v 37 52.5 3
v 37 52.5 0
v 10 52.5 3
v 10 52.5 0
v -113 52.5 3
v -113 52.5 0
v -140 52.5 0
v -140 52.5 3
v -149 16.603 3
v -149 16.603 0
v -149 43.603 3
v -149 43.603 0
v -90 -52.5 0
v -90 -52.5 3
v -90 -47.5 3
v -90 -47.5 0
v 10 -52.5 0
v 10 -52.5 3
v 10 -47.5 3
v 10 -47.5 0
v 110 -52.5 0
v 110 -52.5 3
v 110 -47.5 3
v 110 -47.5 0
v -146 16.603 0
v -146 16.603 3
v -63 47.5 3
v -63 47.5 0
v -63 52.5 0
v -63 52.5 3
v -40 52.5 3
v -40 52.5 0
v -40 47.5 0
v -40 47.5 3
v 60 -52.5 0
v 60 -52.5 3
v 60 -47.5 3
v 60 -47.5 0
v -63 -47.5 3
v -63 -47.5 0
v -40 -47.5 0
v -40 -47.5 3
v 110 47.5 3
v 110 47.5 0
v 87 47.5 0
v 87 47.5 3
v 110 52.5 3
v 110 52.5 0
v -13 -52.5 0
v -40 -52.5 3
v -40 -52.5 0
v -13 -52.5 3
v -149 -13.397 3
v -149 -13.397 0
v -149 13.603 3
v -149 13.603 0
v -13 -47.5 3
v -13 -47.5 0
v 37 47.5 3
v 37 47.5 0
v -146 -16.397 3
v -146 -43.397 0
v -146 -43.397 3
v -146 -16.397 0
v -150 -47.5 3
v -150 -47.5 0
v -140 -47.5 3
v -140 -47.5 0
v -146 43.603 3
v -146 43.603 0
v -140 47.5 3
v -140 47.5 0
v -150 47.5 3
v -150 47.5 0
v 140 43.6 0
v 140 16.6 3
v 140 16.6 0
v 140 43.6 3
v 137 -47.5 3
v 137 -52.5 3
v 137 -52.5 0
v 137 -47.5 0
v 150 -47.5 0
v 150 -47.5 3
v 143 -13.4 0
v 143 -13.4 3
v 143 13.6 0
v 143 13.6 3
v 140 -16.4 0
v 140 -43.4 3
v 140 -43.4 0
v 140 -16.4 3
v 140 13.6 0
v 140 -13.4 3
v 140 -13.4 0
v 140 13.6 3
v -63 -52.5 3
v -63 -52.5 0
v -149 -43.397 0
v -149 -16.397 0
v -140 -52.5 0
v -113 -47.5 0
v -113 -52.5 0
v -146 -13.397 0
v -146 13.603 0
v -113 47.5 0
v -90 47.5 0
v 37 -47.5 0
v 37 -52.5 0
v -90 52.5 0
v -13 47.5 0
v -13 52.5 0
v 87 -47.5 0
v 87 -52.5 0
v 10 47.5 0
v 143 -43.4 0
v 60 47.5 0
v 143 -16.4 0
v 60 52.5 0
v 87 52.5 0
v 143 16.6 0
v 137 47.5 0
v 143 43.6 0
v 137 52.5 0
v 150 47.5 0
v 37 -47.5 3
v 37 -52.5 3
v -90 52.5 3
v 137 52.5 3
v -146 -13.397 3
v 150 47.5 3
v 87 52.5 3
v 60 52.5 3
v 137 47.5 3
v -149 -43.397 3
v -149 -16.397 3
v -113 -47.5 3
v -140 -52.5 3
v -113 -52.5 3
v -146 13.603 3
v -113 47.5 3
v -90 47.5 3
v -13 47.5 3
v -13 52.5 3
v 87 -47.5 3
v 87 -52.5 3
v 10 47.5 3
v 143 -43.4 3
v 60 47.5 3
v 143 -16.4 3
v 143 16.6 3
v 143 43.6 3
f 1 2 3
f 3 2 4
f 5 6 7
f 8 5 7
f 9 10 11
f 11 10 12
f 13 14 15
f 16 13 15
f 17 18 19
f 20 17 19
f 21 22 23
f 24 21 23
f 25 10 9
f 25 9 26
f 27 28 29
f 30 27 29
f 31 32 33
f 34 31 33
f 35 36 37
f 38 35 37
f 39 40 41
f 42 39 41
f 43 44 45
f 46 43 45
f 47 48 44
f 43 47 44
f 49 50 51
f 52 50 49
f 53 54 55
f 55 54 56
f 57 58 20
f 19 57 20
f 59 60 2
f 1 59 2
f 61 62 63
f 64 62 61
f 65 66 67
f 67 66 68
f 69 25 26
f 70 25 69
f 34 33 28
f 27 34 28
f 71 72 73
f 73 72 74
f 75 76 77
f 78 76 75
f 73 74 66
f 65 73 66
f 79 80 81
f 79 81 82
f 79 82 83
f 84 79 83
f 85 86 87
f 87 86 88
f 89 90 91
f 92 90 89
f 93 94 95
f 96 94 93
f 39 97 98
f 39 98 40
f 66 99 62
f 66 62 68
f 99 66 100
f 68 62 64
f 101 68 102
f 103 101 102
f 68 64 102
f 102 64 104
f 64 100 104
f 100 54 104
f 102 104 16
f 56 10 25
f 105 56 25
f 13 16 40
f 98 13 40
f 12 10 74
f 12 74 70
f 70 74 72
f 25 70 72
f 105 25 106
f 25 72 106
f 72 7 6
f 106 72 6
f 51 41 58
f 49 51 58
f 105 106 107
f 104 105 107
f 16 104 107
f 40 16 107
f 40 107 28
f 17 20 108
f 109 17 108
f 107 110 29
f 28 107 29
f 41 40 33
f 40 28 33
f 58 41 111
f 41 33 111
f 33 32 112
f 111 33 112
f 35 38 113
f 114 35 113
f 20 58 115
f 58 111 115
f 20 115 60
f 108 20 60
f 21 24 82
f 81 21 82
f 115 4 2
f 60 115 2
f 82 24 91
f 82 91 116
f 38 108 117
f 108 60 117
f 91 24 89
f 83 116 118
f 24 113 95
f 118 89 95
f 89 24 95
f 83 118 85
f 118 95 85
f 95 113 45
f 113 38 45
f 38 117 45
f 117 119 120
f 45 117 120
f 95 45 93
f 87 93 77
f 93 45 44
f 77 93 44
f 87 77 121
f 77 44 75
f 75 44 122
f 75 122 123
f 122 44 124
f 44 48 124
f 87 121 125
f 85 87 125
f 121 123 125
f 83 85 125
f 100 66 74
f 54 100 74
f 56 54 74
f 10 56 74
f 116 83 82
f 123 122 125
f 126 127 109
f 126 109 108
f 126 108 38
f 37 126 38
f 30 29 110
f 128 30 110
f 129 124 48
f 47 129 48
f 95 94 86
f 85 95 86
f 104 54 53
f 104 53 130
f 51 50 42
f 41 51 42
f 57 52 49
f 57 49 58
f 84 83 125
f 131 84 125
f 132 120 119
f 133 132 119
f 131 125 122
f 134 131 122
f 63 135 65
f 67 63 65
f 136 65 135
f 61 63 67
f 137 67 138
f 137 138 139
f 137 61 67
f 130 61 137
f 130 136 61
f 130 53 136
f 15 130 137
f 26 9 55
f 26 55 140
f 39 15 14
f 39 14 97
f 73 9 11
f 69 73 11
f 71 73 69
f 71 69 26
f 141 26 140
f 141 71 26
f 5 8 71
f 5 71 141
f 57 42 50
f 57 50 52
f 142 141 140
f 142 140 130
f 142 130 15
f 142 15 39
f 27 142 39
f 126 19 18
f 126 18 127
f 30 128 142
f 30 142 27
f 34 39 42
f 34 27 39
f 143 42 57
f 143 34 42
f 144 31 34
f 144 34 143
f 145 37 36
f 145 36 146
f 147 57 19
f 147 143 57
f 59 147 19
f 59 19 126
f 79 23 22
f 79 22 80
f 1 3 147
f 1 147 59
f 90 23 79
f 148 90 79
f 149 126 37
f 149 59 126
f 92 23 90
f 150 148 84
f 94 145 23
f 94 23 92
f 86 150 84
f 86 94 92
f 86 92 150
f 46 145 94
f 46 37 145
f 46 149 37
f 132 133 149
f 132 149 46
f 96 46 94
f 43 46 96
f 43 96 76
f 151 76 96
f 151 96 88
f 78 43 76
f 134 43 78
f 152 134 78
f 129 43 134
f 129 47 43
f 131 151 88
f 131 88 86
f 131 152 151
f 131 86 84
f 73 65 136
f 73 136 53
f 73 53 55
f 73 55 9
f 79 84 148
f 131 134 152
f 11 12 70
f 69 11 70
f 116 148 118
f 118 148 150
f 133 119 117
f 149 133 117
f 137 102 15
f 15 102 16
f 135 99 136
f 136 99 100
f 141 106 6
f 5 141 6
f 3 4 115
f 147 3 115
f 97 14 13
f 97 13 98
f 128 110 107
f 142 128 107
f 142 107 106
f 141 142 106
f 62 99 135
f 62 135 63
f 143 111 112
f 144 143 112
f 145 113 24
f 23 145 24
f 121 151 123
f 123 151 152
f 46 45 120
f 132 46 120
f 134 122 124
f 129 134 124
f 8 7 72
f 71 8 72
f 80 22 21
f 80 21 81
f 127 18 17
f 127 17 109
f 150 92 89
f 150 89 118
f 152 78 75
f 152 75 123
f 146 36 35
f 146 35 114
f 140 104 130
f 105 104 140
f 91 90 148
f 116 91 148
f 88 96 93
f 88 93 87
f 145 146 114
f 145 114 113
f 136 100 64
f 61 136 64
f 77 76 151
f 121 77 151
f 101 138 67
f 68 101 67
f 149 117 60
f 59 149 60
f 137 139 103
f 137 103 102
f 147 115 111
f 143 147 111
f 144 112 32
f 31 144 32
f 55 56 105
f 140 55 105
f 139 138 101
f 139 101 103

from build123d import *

# Parameters (mm, degrees)
SKETCH1_W           = 3
SKETCH1_H           = 27
BOSS_EXTRUDE1_DEPTH = 3
SKETCH2_W           = 3
SKETCH2_H           = 27
CUT_EXTRUDE1_DEPTH  = 10
SKETCH3_W           = 27
SKETCH3_H           = 5
BOSS_EXTRUDE3_DEPTH = 3


with BuildPart() as part:
    # Sketch1 → Boss-Extrude1 (new body)
    with BuildSketch(Plane.XY):
        Polygon((-90, 52.5), (-90, 47.5), (-113, 47.5), (-113, 52.5), (-140, 52.5), (-140, 47.5), (-150, 47.5), (-150, -47.5), (150, -47.5), (150, 47.5), (137, 47.5), (137, 52.5), (110, 52.5), (110, 47.5), (87, 47.5), (87, 52.5), (60, 52.5), (60, 47.5), (37, 47.5), (37, 52.5), (10, 52.5), (10, 47.5), (-13, 47.5), (-13, 52.5), (-40, 52.5), (-40, 47.5), (-63, 47.5), (-63, 52.5), align=None)
        with Locations((-147.5, 30.102605219)):
            Rectangle(SKETCH1_W, SKETCH1_H, mode=Mode.SUBTRACT)
        with Locations((-147.5, -29.897394781)):
            Rectangle(SKETCH1_W, SKETCH1_H, mode=Mode.SUBTRACT)
        with Locations((-147.5, 0.102605219)):
            Rectangle(SKETCH1_W, SKETCH1_H, mode=Mode.SUBTRACT)
    extrude(amount=BOSS_EXTRUDE1_DEPTH)

    # Sketch2 → Cut-Extrude1 (cut)
    with BuildSketch(Plane.XY.offset(3)):
        with Locations((141.5, 30.1)):
            Rectangle(SKETCH2_W, SKETCH2_H)
        with Locations((141.5, 0.1)):
            Rectangle(SKETCH2_W, SKETCH2_H)
        with Locations((141.5, -29.9)):
            Rectangle(SKETCH2_W, SKETCH2_H)
    extrude(amount=-CUT_EXTRUDE1_DEPTH, mode=Mode.SUBTRACT)

    # Sketch3 → Boss-Extrude3 (add)
    with BuildSketch(Plane.XY.offset(3)):
        with Locations((-126.5, -50)):
            Rectangle(SKETCH3_W, SKETCH3_H)
        with Locations((-76.5, -50)):
            Rectangle(SKETCH3_W, SKETCH3_H)
        with Locations((-26.5, -50)):
            Rectangle(SKETCH3_W, SKETCH3_H)
        with Locations((23.5, -50)):
            Rectangle(SKETCH3_W, SKETCH3_H)
        with Locations((73.5, -50)):
            Rectangle(SKETCH3_W, SKETCH3_H)
        with Locations((123.5, -50)):
            Rectangle(SKETCH3_W, SKETCH3_H)
    extrude(amount=-BOSS_EXTRUDE3_DEPTH)


solid = part.part
